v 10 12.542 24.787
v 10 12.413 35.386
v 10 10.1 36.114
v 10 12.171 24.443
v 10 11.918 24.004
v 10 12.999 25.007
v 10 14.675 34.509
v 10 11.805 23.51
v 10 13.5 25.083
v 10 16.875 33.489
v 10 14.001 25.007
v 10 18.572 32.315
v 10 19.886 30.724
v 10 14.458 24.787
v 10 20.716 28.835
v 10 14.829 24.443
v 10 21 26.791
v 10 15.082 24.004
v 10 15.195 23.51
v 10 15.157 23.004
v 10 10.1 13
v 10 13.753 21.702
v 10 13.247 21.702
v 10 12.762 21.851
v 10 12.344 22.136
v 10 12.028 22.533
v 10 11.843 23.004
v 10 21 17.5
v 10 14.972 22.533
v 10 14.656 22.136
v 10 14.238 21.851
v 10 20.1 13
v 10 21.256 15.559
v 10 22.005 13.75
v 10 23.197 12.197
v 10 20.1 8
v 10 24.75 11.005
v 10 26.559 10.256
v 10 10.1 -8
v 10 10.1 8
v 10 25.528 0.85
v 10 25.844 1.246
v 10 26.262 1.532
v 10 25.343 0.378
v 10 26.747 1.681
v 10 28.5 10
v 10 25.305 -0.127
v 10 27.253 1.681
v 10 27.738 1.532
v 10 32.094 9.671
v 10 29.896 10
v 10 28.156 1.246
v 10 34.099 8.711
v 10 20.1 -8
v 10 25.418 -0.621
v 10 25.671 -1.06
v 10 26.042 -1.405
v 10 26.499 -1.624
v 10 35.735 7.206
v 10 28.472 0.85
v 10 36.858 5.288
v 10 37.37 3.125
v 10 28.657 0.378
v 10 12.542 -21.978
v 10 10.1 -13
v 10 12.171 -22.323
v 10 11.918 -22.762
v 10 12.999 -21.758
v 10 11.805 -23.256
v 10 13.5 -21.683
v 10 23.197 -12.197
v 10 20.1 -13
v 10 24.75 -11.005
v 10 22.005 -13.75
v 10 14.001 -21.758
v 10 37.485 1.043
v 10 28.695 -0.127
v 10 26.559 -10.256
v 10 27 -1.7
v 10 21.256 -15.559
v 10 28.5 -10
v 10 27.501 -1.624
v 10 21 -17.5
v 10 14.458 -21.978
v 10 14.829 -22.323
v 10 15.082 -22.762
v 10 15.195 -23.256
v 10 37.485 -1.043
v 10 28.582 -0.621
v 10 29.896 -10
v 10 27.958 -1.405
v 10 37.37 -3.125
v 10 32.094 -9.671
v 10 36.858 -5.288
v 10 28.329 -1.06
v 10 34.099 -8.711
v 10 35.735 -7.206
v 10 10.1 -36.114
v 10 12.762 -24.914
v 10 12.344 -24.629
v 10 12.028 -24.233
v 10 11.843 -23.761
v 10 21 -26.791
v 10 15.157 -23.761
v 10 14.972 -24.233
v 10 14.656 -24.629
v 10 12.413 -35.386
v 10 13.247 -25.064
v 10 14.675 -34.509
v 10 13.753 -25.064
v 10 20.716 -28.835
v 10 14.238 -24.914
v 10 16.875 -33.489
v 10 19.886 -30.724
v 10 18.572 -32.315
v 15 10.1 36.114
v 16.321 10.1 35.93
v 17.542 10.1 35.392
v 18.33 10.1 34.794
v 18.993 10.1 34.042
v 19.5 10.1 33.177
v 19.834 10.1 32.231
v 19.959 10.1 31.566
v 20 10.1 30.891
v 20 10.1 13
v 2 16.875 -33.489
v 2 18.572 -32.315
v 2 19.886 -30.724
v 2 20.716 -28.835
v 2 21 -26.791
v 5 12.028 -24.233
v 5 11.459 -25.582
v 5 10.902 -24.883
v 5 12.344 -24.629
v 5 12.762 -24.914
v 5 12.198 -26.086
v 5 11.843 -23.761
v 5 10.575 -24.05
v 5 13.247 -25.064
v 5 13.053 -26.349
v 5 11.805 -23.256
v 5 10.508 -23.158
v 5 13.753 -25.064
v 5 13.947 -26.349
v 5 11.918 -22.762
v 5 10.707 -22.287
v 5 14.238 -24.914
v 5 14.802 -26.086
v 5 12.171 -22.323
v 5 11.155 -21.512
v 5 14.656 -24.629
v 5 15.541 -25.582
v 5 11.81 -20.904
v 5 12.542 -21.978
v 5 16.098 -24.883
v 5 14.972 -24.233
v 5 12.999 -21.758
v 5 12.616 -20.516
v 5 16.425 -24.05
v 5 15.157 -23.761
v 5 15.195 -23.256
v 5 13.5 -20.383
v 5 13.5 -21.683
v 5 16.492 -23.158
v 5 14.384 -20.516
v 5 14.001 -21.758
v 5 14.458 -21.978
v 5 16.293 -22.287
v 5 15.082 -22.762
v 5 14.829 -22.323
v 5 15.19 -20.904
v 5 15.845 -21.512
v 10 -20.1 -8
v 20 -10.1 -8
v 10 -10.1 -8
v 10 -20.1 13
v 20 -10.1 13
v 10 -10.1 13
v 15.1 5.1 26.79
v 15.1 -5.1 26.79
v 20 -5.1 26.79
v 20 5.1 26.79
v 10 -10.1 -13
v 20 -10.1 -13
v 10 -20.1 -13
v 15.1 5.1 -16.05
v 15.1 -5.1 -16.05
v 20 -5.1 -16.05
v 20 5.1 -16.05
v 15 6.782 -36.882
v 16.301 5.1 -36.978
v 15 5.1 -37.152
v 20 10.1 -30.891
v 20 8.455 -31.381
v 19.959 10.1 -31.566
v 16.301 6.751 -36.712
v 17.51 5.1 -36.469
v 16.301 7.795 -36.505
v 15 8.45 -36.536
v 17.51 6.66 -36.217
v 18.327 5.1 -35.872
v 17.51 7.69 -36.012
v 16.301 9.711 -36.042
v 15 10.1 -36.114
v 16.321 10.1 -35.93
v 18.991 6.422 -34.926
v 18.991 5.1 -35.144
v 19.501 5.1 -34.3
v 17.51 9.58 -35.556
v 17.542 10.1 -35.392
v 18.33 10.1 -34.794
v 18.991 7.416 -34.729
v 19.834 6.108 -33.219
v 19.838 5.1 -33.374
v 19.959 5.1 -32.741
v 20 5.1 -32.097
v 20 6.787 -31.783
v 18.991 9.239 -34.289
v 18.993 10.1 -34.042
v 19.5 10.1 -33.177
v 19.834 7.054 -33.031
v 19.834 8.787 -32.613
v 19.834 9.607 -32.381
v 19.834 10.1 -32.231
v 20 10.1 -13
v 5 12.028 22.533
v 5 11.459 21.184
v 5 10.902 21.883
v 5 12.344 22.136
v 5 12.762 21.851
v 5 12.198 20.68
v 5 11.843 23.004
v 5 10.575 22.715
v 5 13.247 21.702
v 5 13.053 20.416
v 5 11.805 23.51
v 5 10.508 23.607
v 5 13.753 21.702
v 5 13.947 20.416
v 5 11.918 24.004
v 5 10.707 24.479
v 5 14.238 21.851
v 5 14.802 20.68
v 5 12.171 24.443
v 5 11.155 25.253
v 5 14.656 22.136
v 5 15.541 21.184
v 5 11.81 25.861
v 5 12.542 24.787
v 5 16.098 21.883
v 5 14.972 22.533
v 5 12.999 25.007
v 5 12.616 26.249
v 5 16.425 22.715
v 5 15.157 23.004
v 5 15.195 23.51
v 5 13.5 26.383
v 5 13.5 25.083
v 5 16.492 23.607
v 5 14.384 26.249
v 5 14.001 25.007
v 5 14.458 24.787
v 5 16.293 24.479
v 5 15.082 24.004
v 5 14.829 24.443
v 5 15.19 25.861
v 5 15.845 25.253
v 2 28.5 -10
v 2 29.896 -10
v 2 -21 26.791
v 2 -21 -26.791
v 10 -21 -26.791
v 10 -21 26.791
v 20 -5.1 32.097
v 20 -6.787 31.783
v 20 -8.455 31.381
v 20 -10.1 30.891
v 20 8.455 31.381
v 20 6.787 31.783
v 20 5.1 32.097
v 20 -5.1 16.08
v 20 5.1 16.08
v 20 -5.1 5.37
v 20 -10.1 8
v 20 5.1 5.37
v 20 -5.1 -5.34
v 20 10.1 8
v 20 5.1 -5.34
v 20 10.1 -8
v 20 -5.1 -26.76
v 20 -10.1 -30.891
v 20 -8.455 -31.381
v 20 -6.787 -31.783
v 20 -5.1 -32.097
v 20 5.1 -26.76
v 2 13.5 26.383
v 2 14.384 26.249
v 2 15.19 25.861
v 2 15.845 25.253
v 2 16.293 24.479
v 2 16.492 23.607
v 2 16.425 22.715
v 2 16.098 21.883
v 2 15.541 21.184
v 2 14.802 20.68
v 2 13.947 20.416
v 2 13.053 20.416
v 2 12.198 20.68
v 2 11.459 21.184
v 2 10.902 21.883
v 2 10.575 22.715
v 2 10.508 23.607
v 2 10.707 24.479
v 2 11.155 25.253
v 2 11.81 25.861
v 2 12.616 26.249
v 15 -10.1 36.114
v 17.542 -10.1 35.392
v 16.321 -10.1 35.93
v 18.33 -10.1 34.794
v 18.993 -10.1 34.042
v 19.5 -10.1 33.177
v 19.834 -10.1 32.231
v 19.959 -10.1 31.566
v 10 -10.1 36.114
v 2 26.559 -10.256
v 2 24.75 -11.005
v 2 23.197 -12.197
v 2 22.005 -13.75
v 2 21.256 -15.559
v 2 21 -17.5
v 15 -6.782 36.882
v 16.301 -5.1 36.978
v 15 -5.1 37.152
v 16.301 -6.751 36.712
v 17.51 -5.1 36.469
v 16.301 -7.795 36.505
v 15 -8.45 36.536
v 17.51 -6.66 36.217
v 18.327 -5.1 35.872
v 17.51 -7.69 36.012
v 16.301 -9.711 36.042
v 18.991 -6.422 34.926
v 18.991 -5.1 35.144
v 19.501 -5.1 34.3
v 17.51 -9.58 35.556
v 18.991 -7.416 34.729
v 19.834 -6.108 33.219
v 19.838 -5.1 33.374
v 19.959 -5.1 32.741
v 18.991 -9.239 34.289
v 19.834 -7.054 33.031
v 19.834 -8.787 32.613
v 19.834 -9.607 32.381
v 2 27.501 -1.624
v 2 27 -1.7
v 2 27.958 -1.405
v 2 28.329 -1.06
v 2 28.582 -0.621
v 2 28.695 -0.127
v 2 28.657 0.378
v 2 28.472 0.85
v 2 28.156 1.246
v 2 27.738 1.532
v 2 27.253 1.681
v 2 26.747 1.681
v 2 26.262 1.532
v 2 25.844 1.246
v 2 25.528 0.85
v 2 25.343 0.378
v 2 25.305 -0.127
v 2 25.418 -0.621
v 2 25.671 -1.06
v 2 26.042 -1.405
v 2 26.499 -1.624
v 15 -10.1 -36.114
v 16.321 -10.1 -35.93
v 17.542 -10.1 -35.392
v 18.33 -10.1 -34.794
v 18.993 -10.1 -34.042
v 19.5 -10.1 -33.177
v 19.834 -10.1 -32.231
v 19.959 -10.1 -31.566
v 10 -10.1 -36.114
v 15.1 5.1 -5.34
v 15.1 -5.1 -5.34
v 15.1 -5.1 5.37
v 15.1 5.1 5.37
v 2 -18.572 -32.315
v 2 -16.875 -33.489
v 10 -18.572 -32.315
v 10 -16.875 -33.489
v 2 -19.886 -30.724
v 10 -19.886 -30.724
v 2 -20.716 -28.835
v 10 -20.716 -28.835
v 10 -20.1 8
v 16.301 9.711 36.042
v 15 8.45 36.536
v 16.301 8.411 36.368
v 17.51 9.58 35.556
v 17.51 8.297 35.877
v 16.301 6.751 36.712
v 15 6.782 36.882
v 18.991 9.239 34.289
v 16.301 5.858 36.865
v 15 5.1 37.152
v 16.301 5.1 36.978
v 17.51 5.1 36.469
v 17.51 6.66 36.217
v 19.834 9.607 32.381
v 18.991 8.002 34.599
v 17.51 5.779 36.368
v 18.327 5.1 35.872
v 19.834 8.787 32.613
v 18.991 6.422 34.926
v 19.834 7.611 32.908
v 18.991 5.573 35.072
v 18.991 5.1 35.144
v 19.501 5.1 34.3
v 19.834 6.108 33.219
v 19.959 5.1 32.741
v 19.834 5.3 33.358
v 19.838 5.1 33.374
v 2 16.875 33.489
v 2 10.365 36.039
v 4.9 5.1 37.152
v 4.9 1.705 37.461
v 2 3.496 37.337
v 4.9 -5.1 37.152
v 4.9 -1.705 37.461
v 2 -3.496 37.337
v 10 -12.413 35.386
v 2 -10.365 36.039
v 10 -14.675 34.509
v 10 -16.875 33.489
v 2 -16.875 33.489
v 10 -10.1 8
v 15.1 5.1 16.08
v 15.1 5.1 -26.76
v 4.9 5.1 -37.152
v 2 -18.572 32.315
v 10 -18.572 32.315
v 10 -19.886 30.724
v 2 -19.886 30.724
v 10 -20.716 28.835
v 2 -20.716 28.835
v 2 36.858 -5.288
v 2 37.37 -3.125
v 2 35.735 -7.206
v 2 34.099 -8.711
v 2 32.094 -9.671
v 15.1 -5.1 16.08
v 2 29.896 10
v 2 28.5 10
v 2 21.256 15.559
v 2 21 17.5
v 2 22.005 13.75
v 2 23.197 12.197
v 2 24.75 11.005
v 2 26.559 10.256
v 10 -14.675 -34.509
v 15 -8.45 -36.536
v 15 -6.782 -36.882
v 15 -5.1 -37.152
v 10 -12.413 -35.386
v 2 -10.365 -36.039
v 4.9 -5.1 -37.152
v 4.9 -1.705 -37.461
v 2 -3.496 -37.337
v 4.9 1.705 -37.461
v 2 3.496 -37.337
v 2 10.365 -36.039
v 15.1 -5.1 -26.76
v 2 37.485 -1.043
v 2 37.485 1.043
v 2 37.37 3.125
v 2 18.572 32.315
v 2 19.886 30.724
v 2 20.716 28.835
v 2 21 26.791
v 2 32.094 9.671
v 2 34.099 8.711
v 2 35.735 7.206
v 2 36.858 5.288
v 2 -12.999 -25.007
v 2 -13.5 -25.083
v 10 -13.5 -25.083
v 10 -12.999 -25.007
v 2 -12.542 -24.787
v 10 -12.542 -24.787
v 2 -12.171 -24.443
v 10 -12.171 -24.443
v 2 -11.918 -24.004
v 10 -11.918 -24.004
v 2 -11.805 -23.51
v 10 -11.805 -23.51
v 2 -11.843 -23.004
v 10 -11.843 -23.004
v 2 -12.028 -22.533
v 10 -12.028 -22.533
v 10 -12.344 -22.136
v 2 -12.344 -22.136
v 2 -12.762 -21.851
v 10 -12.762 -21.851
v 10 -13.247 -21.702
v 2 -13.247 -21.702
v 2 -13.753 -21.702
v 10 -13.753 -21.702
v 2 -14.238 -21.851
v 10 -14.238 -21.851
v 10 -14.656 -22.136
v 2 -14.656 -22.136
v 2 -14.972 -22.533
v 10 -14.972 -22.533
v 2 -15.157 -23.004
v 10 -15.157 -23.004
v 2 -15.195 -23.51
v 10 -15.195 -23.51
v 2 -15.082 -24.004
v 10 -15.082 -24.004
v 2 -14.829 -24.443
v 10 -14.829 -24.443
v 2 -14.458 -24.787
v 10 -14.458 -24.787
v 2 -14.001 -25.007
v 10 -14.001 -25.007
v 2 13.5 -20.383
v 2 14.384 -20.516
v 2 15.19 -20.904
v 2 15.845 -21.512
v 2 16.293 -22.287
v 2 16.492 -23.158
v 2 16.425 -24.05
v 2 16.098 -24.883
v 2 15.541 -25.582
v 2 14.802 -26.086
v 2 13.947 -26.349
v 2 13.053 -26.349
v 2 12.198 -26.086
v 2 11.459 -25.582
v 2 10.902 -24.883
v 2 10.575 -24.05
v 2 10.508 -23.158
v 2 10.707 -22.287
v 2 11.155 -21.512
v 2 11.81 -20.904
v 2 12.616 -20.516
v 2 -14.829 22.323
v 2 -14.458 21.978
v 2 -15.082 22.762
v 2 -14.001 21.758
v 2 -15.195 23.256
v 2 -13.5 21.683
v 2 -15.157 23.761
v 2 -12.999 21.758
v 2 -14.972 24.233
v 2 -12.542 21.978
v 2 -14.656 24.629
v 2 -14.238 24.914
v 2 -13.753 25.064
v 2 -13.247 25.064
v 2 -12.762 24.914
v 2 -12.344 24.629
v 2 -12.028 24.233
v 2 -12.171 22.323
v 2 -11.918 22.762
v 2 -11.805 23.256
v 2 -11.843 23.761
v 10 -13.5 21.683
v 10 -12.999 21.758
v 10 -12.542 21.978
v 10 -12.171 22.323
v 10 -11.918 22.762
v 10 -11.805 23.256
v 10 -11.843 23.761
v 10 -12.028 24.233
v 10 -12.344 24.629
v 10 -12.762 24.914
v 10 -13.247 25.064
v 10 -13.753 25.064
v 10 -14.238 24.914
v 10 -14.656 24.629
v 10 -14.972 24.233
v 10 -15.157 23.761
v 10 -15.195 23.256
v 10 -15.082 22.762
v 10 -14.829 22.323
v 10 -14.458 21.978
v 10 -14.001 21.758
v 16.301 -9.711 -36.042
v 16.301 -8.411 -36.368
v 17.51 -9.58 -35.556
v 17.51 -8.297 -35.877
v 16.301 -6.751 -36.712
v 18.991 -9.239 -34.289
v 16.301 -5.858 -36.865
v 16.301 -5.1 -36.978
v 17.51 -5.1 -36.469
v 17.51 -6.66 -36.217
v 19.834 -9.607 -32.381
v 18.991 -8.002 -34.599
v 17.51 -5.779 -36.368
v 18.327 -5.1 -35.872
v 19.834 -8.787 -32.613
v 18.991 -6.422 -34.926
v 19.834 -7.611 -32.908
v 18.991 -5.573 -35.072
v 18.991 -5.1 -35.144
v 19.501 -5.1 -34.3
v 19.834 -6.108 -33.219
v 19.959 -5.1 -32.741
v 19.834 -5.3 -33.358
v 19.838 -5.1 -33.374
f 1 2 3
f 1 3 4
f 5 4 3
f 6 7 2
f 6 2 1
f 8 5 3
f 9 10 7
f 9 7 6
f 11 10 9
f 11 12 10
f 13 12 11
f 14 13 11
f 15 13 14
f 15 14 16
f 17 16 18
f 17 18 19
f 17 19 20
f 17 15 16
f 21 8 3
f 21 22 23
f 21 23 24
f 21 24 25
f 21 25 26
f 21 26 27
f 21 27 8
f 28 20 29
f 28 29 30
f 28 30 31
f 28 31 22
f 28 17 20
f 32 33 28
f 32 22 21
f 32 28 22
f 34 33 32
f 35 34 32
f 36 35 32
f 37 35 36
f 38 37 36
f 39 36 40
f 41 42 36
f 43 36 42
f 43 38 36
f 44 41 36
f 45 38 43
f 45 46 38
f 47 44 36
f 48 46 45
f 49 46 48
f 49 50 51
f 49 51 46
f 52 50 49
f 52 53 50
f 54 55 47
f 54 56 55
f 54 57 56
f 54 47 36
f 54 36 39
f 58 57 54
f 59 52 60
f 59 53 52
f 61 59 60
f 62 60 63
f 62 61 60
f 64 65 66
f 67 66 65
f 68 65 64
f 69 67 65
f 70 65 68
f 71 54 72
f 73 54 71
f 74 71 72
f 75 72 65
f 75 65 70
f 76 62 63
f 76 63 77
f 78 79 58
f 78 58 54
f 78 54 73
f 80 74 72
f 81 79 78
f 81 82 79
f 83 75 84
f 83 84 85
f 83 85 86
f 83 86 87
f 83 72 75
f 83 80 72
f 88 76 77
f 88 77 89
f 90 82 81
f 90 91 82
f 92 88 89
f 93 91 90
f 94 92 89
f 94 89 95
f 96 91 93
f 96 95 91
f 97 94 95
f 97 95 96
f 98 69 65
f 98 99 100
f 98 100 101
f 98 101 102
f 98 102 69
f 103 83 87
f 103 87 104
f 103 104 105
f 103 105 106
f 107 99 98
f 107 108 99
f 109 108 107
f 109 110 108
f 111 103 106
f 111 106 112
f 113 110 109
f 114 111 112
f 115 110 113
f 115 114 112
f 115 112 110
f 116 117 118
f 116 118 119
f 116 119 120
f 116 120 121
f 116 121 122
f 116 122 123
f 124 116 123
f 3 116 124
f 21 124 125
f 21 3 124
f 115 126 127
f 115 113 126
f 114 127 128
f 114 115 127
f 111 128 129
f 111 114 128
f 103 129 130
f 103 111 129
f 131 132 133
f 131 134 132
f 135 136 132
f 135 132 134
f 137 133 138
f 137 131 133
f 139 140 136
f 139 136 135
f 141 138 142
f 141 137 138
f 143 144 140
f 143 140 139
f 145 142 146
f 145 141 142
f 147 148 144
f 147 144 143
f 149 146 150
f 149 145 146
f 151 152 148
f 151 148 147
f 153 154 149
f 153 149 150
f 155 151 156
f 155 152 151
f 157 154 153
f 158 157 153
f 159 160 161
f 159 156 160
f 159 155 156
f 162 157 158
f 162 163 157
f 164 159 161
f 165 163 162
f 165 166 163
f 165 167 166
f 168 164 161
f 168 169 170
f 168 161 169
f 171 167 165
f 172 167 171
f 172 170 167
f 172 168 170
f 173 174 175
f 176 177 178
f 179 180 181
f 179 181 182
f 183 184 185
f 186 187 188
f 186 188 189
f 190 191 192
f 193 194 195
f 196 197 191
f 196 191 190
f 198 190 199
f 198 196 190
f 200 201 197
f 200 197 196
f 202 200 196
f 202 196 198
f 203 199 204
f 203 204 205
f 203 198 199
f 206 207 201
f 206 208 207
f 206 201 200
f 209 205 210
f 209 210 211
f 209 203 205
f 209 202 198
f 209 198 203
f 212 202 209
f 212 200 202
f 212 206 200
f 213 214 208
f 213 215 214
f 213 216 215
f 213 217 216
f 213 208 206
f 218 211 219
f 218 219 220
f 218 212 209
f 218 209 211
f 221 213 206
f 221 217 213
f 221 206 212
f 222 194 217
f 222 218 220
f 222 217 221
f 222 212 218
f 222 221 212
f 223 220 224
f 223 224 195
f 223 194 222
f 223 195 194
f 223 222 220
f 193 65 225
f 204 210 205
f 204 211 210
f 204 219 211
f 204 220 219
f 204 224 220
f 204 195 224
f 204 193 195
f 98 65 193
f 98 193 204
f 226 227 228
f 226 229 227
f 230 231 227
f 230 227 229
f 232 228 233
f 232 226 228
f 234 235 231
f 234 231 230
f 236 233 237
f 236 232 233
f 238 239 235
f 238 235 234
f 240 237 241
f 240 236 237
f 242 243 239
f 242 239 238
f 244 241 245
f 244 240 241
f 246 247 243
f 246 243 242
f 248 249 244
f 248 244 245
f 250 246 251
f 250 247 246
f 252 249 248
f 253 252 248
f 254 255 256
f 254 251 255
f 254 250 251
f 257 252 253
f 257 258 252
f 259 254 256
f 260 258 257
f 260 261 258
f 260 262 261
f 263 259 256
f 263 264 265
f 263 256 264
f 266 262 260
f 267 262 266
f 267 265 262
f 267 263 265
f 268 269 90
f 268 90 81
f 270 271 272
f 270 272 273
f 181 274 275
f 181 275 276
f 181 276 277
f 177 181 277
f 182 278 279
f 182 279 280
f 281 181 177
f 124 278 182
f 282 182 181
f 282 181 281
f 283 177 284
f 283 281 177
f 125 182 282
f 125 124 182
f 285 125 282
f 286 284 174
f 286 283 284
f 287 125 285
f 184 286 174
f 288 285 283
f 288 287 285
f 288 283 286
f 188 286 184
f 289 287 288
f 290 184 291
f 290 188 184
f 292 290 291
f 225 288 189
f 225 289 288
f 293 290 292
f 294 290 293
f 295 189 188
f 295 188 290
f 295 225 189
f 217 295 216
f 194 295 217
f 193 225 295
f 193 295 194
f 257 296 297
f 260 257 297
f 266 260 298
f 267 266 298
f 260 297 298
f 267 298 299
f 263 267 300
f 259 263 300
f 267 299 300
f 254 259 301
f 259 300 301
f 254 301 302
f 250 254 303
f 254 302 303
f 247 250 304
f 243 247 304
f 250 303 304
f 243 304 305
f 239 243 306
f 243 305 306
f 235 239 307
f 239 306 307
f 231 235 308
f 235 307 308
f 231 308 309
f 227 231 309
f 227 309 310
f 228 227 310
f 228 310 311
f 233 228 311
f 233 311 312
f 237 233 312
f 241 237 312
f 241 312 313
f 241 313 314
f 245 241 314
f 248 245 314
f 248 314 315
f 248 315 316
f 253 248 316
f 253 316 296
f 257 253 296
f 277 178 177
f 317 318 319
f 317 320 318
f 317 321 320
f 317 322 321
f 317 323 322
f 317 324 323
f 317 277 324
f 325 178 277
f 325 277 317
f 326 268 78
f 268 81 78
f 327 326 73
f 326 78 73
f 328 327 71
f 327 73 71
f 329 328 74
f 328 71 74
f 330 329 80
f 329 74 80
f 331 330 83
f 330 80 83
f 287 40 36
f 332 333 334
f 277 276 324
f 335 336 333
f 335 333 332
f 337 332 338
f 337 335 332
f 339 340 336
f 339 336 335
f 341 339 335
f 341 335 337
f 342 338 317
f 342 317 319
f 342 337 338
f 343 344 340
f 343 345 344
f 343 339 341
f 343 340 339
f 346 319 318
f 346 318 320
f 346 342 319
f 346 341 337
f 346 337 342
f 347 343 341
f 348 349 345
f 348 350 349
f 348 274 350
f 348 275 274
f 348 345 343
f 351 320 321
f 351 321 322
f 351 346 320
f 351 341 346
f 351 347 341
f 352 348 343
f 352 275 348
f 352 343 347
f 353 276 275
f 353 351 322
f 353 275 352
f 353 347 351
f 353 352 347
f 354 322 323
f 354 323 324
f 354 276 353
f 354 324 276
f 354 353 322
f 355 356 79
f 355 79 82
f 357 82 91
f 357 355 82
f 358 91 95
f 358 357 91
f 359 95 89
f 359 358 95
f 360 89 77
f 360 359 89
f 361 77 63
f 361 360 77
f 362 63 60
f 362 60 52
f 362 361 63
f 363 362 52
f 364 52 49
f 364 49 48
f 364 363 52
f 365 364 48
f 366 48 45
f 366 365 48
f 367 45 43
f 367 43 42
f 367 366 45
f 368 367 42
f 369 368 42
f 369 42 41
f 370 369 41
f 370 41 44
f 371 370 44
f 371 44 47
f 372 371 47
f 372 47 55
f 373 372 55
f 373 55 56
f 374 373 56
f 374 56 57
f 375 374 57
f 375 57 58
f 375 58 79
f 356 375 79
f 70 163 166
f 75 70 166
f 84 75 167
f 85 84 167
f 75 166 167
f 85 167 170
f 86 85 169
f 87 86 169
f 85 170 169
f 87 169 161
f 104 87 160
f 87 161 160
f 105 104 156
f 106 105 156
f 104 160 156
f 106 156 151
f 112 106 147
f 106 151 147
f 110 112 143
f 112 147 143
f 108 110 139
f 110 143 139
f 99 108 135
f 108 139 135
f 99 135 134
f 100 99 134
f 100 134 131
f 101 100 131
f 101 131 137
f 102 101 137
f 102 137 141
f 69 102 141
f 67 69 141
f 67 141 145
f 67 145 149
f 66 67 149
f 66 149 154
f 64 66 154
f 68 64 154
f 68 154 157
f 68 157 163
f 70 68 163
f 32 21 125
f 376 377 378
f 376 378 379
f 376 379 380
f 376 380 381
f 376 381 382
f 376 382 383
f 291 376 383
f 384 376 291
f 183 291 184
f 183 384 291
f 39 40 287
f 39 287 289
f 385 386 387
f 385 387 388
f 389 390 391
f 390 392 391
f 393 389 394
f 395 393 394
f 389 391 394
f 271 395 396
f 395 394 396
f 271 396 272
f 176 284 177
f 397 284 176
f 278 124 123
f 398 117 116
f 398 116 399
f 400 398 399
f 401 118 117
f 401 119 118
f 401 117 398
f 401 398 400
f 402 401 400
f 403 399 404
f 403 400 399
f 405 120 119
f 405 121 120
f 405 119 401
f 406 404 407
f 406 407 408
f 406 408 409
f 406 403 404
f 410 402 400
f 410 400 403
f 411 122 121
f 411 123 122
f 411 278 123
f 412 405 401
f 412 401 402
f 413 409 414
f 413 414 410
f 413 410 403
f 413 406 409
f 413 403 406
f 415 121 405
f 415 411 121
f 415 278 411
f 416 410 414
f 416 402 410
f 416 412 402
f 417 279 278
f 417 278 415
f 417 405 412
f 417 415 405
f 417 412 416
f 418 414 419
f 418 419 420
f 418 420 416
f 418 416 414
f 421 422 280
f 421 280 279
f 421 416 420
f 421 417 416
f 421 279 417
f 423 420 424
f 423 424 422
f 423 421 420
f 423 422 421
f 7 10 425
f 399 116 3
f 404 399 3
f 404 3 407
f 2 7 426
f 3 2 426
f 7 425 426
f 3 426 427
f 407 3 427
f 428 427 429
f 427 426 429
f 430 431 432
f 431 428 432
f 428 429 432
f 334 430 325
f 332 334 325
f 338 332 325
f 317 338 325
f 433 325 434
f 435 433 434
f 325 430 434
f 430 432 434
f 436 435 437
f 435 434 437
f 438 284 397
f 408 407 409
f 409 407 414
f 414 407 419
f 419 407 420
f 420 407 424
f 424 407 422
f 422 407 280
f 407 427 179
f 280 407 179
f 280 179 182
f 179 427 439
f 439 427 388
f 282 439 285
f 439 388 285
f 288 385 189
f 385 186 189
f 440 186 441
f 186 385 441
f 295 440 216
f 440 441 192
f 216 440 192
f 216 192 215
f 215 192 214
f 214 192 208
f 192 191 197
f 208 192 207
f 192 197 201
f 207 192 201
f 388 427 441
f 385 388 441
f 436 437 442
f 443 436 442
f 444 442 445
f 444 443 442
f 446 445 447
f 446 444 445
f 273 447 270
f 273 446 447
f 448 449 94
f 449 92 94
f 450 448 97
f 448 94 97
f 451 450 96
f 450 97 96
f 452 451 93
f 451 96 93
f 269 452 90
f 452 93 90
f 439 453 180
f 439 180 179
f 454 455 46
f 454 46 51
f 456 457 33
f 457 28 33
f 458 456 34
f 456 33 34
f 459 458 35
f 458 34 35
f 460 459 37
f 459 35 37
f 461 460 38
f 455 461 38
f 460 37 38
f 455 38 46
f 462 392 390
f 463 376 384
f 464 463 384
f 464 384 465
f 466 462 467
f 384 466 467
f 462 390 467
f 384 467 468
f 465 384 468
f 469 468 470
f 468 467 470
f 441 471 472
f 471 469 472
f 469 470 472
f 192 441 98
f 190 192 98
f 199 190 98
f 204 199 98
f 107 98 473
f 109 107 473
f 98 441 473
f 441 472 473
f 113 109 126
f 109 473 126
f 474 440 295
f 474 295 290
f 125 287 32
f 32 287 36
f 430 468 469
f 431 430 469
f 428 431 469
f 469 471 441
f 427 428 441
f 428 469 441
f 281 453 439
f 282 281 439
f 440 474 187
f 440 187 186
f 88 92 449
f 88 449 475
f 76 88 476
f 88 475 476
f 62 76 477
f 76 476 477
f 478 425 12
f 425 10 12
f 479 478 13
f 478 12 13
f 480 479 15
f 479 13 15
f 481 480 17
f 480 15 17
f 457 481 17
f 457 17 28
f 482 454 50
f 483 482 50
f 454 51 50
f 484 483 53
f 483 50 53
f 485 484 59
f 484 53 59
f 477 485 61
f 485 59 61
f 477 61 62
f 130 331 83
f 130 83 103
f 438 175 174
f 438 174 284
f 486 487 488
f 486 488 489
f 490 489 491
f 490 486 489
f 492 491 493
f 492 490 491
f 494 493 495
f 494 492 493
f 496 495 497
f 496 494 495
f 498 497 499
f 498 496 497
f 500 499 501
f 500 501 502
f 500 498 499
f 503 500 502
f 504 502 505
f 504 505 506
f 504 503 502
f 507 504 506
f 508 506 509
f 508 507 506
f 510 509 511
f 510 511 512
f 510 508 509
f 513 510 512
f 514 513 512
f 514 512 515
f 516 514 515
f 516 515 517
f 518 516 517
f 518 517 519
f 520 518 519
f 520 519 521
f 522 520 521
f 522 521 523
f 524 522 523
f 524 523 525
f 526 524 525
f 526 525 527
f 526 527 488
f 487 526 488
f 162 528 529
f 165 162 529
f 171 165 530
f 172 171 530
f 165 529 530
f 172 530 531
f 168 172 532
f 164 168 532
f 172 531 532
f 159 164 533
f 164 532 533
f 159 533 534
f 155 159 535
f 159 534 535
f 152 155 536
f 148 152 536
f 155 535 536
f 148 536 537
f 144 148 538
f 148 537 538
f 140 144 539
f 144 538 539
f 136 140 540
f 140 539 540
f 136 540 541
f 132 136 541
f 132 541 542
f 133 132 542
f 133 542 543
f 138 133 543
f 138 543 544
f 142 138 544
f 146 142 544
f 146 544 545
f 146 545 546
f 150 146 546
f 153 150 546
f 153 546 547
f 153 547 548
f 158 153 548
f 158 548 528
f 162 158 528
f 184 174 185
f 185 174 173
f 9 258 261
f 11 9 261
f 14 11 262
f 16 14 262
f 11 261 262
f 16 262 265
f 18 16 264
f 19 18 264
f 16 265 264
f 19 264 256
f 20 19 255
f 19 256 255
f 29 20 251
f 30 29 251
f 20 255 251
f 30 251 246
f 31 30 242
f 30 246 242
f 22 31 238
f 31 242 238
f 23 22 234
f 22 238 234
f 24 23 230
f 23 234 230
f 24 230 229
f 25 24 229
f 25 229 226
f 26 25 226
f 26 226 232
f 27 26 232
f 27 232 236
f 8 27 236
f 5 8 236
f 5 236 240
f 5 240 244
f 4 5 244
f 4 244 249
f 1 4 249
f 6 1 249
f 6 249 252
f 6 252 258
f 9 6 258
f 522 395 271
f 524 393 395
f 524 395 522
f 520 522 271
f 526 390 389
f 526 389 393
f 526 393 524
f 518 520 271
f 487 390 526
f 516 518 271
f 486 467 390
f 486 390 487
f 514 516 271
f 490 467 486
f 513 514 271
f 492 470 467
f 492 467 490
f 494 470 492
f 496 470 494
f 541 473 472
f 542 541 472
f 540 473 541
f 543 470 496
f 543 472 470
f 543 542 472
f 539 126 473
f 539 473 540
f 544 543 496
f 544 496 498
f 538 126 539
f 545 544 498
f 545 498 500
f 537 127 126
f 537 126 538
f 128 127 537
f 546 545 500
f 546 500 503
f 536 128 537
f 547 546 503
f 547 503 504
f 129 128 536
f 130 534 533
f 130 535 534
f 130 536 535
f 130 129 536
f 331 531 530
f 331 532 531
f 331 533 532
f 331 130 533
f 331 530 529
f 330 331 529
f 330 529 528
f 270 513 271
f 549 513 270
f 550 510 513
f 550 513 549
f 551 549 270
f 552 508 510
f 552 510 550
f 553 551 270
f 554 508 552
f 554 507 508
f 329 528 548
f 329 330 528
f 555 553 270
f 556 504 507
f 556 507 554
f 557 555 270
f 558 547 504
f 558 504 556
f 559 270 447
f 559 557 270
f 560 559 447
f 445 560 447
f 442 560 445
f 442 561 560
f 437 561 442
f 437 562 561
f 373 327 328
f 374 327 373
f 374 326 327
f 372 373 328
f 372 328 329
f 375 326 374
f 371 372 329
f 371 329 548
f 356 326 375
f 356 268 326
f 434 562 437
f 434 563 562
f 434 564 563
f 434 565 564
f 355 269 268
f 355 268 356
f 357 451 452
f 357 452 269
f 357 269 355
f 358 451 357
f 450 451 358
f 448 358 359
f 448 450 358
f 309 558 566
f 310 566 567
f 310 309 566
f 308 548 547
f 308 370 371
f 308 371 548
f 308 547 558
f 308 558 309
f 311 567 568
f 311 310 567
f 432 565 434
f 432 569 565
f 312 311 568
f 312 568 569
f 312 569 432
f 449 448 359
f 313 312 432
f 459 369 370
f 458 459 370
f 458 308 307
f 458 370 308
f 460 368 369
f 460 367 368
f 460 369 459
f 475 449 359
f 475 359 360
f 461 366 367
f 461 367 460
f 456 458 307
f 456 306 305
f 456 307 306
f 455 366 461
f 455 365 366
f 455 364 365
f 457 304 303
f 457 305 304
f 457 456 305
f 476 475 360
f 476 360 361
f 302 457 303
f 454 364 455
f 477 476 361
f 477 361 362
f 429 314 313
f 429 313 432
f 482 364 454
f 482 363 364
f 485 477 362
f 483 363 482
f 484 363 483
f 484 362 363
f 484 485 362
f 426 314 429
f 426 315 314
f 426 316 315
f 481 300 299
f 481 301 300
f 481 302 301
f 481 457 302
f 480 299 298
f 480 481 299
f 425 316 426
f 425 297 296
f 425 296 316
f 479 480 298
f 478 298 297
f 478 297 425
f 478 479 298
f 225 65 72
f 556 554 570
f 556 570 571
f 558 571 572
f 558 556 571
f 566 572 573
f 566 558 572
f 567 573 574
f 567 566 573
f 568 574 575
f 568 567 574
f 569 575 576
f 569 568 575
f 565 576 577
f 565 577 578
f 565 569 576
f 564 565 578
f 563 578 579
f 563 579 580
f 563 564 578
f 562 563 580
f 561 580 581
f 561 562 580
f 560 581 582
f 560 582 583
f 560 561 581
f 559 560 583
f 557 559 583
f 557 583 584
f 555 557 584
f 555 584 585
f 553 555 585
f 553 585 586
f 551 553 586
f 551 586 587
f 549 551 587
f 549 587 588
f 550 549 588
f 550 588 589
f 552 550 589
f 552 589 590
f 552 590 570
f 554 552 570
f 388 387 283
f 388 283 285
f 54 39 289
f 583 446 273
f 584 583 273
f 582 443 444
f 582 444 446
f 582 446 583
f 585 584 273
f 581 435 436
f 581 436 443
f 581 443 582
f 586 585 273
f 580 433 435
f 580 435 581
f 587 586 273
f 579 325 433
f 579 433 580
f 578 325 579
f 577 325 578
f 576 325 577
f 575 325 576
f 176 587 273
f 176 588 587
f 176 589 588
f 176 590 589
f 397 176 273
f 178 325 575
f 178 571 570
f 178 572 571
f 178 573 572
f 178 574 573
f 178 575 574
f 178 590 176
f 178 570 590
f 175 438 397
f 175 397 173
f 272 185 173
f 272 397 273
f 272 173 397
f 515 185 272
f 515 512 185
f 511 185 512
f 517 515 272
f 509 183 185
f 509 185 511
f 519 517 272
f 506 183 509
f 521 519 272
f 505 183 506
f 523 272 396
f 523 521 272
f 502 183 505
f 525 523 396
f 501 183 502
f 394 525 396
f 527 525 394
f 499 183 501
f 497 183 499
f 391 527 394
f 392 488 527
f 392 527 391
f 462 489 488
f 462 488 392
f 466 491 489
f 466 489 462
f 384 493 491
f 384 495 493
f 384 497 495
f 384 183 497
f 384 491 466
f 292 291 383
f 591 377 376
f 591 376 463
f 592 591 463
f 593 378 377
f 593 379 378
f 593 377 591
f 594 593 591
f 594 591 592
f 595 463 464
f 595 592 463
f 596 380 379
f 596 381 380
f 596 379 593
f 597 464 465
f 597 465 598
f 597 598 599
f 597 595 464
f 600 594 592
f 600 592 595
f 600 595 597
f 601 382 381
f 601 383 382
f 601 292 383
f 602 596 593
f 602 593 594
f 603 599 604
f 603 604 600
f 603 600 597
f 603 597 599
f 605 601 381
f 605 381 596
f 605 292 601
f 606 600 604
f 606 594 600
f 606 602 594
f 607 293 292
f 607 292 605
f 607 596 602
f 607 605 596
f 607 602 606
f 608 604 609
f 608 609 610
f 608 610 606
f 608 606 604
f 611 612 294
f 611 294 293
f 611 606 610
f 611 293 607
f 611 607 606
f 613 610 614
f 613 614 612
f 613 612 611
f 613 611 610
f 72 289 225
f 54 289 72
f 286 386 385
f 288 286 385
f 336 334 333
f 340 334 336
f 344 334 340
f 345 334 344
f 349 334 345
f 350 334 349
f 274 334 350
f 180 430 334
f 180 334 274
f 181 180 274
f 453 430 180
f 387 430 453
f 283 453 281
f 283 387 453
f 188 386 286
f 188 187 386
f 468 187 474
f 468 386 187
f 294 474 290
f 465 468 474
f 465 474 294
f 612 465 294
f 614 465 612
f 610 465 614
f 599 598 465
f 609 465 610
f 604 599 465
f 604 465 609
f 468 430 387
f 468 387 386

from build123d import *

# Parameters (mm, degrees)
SKETCH1_R               = 37.5
SKETCH1_R_2             = 1.7
BOSS_EXTRUDE1_DEPTH     = 20
CUT_EXTRUDE1_DEPTH      = 57.678920244
CUT_EXTRUDE1_DEPTH_BACK = 57.678920244
SKETCH2_W               = 10.2
SKETCH2_H               = 10.2
CUT_EXTRUDE2_START      = -10
SKETCH3_R               = 1.7
CUT_EXTRUDE2_DEPTH      = 10
CUT_EXTRUDE4_START      = -10
SKETCH4_W               = 10.71
SKETCH4_H               = 10.2
CUT_EXTRUDE4_DEPTH      = 10
BOSS_EXTRUDE2_START     = 8
BOSS_EXTRUDE2_DEPTH     = 5
SKETCH7_R               = 3
CUT_EXTRUDE5_DEPTH      = 5
SKETCH8_R               = 1.7
CUT_EXTRUDE6_DEPTH      = 15
FILLET1_R               = 5
SKETCH9_R               = 37.5
CUT_EXTRUDE7_DEPTH      = 2
CUT_EXTRUDE8_START      = -10
CUT_EXTRUDE8_DEPTH      = 10
FILLET3_R               = 7.5


with BuildPart() as part:
    # Sketch1 → Boss-Extrude1 (new body)
    with BuildSketch(Plane(origin=(0, 0, 0), x_dir=(0, 0, -1), z_dir=(1, 0, 0))):
        Circle(SKETCH1_R)
        with Locations((0, 27)):
            Circle(SKETCH1_R_2, mode=Mode.SUBTRACT)
        with Locations((23.382685902, -13.5)):
            Circle(SKETCH1_R_2, mode=Mode.SUBTRACT)
        with Locations((-23.382685902, -13.5)):
            Circle(SKETCH1_R_2, mode=Mode.SUBTRACT)
    extrude(amount=BOSS_EXTRUDE1_DEPTH)

    # Sketch2 → Cut-Extrude1 (cut, two sides: drawn at the far end of the back side and taken through both)
    with BuildSketch(Plane.XY.offset(-CUT_EXTRUDE1_DEPTH_BACK)):
        with Locations((10, 0)):
            Rectangle(SKETCH2_W, SKETCH2_H)
    extrude(amount=CUT_EXTRUDE1_DEPTH + CUT_EXTRUDE1_DEPTH_BACK, mode=Mode.SUBTRACT)

    # Sketch3 → Cut-Extrude2 (cut)
    # profile 1 of 2: a face of its own
    with BuildSketch(Plane(origin=(20, 0, 0), x_dir=(0, 0, -1), z_dir=(1, 0, 0)).offset(CUT_EXTRUDE2_START)):
        with BuildLine():
            Line((-36.11426311, 10.1), (36.11426311, 10.1))
            ThreePointArc((36.11426311, 10.1), (0, 37.5), (-36.11426311, 10.1))
        make_face()
        with Locations((0, 27)):
            Circle(SKETCH3_R, mode=Mode.SUBTRACT)
    # profile 2 of 2: a face of its own
    with BuildSketch(Plane(origin=(20, 0, 0), x_dir=(0, 0, -1), z_dir=(1, 0, 0)).offset(CUT_EXTRUDE2_START)):
        with BuildLine():
            ThreePointArc((-36.11426311, -10.1), (0, -37.5), (36.11426311, -10.1))
            Line((36.11426311, -10.1), (-36.11426311, -10.1))
        make_face()
        with Locations((-23.382685902, -13.5)):
            Circle(SKETCH3_R, mode=Mode.SUBTRACT)
        with Locations((23.382685902, -13.5)):
            Circle(SKETCH3_R, mode=Mode.SUBTRACT)
    extrude(amount=CUT_EXTRUDE2_DEPTH, mode=Mode.SUBTRACT)

    # Sketch4 → Cut-Extrude4 (cut)
    with BuildSketch(Plane(origin=(20, 0, 0), x_dir=(0, 0, -1), z_dir=(1, 0, 0)).offset(CUT_EXTRUDE4_START)):
        with BuildLine():
            Line((-26.79, -5.1), (-26.79, 5.1))
            Line((-26.79, 5.1), (-37.151581393, 5.1))
            ThreePointArc((-37.151581393, 5.1), (-37.5, 0), (-37.151581393, -5.1))
            Line((-37.151581393, -5.1), (-26.79, -5.1))
        make_face()
        with Locations((-10.725, 0)):
            Rectangle(SKETCH4_W, SKETCH4_H)
        with Locations((10.695, 0)):
            Rectangle(SKETCH4_W, SKETCH4_H)
        with BuildLine():
            Line((37.151581393, 5.1), (26.76, 5.1))
            Line((26.76, 5.1), (26.76, -5.1))
            Line((26.76, -5.1), (37.151581393, -5.1))
            ThreePointArc((37.151581393, -5.1), (37.5, 0), (37.151581393, 5.1))
        make_face()
    extrude(amount=CUT_EXTRUDE4_DEPTH, mode=Mode.SUBTRACT)

    # Sketch6 → Boss-Extrude2 (add)
    with BuildSketch(Plane.XY.offset(BOSS_EXTRUDE2_START)):
        Polygon((20, 10.1), (10, 20.1), (10, 10.1), align=None)
        Polygon((10, -20.1), (10, -10.1), (20, -10.1), align=None)
    boss_extrude2 = extrude(amount=BOSS_EXTRUDE2_DEPTH)

    # Mirror1: Boss-Extrude2 across plane
    add(boss_extrude2.mirror(Plane.XY))

    # Sketch7 → Cut-Extrude5 (cut)
    with BuildSketch(Plane.ZY):
        with Locations((23.382685902, 13.5)):
            Circle(SKETCH7_R)
        with Locations((0, -27)):
            Circle(SKETCH7_R)
        with Locations((-23.382685902, 13.5)):
            Circle(SKETCH7_R)
    extrude(amount=-CUT_EXTRUDE5_DEPTH, mode=Mode.SUBTRACT)

    # Sketch8 → Cut-Extrude6 (cut)
    with BuildSketch(Plane.ZY):
        with Locations((-23.382685902, 13.5)):
            Circle(SKETCH8_R)
        with Locations((23.382685902, 13.5)):
            Circle(SKETCH8_R)
        with Locations((0, -27)):
            Circle(SKETCH8_R)
    extrude(amount=-CUT_EXTRUDE6_DEPTH, mode=Mode.SUBTRACT)

    # Fillet1
    fillet1_edges = [part.edges().sort_by_distance(p)[0] for p in [
        (20, 7.617677291, 36.718128938),
        (20, -7.617677291, -36.718128938),
        (20, 7.617677291, -36.718128938),
        (20, -7.617677291, 36.718128938),
    ]]
    fillet(fillet1_edges, radius=FILLET1_R)

    # Sketch9 → Cut-Extrude7 (cut)
    with BuildSketch(Plane.ZY):
        Circle(SKETCH9_R)
    extrude(amount=-CUT_EXTRUDE7_DEPTH, mode=Mode.SUBTRACT)

    # Sketch10 → Cut-Extrude8 (cut)
    with BuildSketch(Plane(origin=(10, 0, 0), x_dir=(0, 0, -1), z_dir=(1, 0, 0)).offset(CUT_EXTRUDE8_START)):
        with BuildLine():
            ThreePointArc((-10, 36.142080737), (-21.885509272, 30.451181979), (-31.068472766, 21))
            Line((-31.068472766, 21), (-10, 21))
            Line((-10, 21), (-10, 36.142080737))
        make_face()
        with BuildLine():
            Line((10, 21), (31.068472766, 21))
            ThreePointArc((31.068472766, 21), (21.885509272, 30.451181979), (10, 36.142080737))
            Line((10, 36.142080737), (10, 21))
        make_face()
        with BuildLine():
            Line((31.068472766, -21), (-31.068472766, -21))
            ThreePointArc((-31.068472766, -21), (0, -37.5), (31.068472766, -21))
        make_face()
    extrude(amount=CUT_EXTRUDE8_DEPTH, mode=Mode.SUBTRACT)

    # Fillet3
    fillet3_edges = [part.edges().sort_by_distance(p)[0] for p in [
        (6, -21, 31.068472766),
        (6, -21, -31.068472766),
        (6, 36.142080737, -10),
        (6, 21, -31.068472766),
        (6, 21, -10),
        (6, 36.142080737, 10),
        (6, 21, 10),
        (6, 21, 31.068472766),
    ]]
    fillet(fillet3_edges, radius=FILLET3_R)


solid = part.part
